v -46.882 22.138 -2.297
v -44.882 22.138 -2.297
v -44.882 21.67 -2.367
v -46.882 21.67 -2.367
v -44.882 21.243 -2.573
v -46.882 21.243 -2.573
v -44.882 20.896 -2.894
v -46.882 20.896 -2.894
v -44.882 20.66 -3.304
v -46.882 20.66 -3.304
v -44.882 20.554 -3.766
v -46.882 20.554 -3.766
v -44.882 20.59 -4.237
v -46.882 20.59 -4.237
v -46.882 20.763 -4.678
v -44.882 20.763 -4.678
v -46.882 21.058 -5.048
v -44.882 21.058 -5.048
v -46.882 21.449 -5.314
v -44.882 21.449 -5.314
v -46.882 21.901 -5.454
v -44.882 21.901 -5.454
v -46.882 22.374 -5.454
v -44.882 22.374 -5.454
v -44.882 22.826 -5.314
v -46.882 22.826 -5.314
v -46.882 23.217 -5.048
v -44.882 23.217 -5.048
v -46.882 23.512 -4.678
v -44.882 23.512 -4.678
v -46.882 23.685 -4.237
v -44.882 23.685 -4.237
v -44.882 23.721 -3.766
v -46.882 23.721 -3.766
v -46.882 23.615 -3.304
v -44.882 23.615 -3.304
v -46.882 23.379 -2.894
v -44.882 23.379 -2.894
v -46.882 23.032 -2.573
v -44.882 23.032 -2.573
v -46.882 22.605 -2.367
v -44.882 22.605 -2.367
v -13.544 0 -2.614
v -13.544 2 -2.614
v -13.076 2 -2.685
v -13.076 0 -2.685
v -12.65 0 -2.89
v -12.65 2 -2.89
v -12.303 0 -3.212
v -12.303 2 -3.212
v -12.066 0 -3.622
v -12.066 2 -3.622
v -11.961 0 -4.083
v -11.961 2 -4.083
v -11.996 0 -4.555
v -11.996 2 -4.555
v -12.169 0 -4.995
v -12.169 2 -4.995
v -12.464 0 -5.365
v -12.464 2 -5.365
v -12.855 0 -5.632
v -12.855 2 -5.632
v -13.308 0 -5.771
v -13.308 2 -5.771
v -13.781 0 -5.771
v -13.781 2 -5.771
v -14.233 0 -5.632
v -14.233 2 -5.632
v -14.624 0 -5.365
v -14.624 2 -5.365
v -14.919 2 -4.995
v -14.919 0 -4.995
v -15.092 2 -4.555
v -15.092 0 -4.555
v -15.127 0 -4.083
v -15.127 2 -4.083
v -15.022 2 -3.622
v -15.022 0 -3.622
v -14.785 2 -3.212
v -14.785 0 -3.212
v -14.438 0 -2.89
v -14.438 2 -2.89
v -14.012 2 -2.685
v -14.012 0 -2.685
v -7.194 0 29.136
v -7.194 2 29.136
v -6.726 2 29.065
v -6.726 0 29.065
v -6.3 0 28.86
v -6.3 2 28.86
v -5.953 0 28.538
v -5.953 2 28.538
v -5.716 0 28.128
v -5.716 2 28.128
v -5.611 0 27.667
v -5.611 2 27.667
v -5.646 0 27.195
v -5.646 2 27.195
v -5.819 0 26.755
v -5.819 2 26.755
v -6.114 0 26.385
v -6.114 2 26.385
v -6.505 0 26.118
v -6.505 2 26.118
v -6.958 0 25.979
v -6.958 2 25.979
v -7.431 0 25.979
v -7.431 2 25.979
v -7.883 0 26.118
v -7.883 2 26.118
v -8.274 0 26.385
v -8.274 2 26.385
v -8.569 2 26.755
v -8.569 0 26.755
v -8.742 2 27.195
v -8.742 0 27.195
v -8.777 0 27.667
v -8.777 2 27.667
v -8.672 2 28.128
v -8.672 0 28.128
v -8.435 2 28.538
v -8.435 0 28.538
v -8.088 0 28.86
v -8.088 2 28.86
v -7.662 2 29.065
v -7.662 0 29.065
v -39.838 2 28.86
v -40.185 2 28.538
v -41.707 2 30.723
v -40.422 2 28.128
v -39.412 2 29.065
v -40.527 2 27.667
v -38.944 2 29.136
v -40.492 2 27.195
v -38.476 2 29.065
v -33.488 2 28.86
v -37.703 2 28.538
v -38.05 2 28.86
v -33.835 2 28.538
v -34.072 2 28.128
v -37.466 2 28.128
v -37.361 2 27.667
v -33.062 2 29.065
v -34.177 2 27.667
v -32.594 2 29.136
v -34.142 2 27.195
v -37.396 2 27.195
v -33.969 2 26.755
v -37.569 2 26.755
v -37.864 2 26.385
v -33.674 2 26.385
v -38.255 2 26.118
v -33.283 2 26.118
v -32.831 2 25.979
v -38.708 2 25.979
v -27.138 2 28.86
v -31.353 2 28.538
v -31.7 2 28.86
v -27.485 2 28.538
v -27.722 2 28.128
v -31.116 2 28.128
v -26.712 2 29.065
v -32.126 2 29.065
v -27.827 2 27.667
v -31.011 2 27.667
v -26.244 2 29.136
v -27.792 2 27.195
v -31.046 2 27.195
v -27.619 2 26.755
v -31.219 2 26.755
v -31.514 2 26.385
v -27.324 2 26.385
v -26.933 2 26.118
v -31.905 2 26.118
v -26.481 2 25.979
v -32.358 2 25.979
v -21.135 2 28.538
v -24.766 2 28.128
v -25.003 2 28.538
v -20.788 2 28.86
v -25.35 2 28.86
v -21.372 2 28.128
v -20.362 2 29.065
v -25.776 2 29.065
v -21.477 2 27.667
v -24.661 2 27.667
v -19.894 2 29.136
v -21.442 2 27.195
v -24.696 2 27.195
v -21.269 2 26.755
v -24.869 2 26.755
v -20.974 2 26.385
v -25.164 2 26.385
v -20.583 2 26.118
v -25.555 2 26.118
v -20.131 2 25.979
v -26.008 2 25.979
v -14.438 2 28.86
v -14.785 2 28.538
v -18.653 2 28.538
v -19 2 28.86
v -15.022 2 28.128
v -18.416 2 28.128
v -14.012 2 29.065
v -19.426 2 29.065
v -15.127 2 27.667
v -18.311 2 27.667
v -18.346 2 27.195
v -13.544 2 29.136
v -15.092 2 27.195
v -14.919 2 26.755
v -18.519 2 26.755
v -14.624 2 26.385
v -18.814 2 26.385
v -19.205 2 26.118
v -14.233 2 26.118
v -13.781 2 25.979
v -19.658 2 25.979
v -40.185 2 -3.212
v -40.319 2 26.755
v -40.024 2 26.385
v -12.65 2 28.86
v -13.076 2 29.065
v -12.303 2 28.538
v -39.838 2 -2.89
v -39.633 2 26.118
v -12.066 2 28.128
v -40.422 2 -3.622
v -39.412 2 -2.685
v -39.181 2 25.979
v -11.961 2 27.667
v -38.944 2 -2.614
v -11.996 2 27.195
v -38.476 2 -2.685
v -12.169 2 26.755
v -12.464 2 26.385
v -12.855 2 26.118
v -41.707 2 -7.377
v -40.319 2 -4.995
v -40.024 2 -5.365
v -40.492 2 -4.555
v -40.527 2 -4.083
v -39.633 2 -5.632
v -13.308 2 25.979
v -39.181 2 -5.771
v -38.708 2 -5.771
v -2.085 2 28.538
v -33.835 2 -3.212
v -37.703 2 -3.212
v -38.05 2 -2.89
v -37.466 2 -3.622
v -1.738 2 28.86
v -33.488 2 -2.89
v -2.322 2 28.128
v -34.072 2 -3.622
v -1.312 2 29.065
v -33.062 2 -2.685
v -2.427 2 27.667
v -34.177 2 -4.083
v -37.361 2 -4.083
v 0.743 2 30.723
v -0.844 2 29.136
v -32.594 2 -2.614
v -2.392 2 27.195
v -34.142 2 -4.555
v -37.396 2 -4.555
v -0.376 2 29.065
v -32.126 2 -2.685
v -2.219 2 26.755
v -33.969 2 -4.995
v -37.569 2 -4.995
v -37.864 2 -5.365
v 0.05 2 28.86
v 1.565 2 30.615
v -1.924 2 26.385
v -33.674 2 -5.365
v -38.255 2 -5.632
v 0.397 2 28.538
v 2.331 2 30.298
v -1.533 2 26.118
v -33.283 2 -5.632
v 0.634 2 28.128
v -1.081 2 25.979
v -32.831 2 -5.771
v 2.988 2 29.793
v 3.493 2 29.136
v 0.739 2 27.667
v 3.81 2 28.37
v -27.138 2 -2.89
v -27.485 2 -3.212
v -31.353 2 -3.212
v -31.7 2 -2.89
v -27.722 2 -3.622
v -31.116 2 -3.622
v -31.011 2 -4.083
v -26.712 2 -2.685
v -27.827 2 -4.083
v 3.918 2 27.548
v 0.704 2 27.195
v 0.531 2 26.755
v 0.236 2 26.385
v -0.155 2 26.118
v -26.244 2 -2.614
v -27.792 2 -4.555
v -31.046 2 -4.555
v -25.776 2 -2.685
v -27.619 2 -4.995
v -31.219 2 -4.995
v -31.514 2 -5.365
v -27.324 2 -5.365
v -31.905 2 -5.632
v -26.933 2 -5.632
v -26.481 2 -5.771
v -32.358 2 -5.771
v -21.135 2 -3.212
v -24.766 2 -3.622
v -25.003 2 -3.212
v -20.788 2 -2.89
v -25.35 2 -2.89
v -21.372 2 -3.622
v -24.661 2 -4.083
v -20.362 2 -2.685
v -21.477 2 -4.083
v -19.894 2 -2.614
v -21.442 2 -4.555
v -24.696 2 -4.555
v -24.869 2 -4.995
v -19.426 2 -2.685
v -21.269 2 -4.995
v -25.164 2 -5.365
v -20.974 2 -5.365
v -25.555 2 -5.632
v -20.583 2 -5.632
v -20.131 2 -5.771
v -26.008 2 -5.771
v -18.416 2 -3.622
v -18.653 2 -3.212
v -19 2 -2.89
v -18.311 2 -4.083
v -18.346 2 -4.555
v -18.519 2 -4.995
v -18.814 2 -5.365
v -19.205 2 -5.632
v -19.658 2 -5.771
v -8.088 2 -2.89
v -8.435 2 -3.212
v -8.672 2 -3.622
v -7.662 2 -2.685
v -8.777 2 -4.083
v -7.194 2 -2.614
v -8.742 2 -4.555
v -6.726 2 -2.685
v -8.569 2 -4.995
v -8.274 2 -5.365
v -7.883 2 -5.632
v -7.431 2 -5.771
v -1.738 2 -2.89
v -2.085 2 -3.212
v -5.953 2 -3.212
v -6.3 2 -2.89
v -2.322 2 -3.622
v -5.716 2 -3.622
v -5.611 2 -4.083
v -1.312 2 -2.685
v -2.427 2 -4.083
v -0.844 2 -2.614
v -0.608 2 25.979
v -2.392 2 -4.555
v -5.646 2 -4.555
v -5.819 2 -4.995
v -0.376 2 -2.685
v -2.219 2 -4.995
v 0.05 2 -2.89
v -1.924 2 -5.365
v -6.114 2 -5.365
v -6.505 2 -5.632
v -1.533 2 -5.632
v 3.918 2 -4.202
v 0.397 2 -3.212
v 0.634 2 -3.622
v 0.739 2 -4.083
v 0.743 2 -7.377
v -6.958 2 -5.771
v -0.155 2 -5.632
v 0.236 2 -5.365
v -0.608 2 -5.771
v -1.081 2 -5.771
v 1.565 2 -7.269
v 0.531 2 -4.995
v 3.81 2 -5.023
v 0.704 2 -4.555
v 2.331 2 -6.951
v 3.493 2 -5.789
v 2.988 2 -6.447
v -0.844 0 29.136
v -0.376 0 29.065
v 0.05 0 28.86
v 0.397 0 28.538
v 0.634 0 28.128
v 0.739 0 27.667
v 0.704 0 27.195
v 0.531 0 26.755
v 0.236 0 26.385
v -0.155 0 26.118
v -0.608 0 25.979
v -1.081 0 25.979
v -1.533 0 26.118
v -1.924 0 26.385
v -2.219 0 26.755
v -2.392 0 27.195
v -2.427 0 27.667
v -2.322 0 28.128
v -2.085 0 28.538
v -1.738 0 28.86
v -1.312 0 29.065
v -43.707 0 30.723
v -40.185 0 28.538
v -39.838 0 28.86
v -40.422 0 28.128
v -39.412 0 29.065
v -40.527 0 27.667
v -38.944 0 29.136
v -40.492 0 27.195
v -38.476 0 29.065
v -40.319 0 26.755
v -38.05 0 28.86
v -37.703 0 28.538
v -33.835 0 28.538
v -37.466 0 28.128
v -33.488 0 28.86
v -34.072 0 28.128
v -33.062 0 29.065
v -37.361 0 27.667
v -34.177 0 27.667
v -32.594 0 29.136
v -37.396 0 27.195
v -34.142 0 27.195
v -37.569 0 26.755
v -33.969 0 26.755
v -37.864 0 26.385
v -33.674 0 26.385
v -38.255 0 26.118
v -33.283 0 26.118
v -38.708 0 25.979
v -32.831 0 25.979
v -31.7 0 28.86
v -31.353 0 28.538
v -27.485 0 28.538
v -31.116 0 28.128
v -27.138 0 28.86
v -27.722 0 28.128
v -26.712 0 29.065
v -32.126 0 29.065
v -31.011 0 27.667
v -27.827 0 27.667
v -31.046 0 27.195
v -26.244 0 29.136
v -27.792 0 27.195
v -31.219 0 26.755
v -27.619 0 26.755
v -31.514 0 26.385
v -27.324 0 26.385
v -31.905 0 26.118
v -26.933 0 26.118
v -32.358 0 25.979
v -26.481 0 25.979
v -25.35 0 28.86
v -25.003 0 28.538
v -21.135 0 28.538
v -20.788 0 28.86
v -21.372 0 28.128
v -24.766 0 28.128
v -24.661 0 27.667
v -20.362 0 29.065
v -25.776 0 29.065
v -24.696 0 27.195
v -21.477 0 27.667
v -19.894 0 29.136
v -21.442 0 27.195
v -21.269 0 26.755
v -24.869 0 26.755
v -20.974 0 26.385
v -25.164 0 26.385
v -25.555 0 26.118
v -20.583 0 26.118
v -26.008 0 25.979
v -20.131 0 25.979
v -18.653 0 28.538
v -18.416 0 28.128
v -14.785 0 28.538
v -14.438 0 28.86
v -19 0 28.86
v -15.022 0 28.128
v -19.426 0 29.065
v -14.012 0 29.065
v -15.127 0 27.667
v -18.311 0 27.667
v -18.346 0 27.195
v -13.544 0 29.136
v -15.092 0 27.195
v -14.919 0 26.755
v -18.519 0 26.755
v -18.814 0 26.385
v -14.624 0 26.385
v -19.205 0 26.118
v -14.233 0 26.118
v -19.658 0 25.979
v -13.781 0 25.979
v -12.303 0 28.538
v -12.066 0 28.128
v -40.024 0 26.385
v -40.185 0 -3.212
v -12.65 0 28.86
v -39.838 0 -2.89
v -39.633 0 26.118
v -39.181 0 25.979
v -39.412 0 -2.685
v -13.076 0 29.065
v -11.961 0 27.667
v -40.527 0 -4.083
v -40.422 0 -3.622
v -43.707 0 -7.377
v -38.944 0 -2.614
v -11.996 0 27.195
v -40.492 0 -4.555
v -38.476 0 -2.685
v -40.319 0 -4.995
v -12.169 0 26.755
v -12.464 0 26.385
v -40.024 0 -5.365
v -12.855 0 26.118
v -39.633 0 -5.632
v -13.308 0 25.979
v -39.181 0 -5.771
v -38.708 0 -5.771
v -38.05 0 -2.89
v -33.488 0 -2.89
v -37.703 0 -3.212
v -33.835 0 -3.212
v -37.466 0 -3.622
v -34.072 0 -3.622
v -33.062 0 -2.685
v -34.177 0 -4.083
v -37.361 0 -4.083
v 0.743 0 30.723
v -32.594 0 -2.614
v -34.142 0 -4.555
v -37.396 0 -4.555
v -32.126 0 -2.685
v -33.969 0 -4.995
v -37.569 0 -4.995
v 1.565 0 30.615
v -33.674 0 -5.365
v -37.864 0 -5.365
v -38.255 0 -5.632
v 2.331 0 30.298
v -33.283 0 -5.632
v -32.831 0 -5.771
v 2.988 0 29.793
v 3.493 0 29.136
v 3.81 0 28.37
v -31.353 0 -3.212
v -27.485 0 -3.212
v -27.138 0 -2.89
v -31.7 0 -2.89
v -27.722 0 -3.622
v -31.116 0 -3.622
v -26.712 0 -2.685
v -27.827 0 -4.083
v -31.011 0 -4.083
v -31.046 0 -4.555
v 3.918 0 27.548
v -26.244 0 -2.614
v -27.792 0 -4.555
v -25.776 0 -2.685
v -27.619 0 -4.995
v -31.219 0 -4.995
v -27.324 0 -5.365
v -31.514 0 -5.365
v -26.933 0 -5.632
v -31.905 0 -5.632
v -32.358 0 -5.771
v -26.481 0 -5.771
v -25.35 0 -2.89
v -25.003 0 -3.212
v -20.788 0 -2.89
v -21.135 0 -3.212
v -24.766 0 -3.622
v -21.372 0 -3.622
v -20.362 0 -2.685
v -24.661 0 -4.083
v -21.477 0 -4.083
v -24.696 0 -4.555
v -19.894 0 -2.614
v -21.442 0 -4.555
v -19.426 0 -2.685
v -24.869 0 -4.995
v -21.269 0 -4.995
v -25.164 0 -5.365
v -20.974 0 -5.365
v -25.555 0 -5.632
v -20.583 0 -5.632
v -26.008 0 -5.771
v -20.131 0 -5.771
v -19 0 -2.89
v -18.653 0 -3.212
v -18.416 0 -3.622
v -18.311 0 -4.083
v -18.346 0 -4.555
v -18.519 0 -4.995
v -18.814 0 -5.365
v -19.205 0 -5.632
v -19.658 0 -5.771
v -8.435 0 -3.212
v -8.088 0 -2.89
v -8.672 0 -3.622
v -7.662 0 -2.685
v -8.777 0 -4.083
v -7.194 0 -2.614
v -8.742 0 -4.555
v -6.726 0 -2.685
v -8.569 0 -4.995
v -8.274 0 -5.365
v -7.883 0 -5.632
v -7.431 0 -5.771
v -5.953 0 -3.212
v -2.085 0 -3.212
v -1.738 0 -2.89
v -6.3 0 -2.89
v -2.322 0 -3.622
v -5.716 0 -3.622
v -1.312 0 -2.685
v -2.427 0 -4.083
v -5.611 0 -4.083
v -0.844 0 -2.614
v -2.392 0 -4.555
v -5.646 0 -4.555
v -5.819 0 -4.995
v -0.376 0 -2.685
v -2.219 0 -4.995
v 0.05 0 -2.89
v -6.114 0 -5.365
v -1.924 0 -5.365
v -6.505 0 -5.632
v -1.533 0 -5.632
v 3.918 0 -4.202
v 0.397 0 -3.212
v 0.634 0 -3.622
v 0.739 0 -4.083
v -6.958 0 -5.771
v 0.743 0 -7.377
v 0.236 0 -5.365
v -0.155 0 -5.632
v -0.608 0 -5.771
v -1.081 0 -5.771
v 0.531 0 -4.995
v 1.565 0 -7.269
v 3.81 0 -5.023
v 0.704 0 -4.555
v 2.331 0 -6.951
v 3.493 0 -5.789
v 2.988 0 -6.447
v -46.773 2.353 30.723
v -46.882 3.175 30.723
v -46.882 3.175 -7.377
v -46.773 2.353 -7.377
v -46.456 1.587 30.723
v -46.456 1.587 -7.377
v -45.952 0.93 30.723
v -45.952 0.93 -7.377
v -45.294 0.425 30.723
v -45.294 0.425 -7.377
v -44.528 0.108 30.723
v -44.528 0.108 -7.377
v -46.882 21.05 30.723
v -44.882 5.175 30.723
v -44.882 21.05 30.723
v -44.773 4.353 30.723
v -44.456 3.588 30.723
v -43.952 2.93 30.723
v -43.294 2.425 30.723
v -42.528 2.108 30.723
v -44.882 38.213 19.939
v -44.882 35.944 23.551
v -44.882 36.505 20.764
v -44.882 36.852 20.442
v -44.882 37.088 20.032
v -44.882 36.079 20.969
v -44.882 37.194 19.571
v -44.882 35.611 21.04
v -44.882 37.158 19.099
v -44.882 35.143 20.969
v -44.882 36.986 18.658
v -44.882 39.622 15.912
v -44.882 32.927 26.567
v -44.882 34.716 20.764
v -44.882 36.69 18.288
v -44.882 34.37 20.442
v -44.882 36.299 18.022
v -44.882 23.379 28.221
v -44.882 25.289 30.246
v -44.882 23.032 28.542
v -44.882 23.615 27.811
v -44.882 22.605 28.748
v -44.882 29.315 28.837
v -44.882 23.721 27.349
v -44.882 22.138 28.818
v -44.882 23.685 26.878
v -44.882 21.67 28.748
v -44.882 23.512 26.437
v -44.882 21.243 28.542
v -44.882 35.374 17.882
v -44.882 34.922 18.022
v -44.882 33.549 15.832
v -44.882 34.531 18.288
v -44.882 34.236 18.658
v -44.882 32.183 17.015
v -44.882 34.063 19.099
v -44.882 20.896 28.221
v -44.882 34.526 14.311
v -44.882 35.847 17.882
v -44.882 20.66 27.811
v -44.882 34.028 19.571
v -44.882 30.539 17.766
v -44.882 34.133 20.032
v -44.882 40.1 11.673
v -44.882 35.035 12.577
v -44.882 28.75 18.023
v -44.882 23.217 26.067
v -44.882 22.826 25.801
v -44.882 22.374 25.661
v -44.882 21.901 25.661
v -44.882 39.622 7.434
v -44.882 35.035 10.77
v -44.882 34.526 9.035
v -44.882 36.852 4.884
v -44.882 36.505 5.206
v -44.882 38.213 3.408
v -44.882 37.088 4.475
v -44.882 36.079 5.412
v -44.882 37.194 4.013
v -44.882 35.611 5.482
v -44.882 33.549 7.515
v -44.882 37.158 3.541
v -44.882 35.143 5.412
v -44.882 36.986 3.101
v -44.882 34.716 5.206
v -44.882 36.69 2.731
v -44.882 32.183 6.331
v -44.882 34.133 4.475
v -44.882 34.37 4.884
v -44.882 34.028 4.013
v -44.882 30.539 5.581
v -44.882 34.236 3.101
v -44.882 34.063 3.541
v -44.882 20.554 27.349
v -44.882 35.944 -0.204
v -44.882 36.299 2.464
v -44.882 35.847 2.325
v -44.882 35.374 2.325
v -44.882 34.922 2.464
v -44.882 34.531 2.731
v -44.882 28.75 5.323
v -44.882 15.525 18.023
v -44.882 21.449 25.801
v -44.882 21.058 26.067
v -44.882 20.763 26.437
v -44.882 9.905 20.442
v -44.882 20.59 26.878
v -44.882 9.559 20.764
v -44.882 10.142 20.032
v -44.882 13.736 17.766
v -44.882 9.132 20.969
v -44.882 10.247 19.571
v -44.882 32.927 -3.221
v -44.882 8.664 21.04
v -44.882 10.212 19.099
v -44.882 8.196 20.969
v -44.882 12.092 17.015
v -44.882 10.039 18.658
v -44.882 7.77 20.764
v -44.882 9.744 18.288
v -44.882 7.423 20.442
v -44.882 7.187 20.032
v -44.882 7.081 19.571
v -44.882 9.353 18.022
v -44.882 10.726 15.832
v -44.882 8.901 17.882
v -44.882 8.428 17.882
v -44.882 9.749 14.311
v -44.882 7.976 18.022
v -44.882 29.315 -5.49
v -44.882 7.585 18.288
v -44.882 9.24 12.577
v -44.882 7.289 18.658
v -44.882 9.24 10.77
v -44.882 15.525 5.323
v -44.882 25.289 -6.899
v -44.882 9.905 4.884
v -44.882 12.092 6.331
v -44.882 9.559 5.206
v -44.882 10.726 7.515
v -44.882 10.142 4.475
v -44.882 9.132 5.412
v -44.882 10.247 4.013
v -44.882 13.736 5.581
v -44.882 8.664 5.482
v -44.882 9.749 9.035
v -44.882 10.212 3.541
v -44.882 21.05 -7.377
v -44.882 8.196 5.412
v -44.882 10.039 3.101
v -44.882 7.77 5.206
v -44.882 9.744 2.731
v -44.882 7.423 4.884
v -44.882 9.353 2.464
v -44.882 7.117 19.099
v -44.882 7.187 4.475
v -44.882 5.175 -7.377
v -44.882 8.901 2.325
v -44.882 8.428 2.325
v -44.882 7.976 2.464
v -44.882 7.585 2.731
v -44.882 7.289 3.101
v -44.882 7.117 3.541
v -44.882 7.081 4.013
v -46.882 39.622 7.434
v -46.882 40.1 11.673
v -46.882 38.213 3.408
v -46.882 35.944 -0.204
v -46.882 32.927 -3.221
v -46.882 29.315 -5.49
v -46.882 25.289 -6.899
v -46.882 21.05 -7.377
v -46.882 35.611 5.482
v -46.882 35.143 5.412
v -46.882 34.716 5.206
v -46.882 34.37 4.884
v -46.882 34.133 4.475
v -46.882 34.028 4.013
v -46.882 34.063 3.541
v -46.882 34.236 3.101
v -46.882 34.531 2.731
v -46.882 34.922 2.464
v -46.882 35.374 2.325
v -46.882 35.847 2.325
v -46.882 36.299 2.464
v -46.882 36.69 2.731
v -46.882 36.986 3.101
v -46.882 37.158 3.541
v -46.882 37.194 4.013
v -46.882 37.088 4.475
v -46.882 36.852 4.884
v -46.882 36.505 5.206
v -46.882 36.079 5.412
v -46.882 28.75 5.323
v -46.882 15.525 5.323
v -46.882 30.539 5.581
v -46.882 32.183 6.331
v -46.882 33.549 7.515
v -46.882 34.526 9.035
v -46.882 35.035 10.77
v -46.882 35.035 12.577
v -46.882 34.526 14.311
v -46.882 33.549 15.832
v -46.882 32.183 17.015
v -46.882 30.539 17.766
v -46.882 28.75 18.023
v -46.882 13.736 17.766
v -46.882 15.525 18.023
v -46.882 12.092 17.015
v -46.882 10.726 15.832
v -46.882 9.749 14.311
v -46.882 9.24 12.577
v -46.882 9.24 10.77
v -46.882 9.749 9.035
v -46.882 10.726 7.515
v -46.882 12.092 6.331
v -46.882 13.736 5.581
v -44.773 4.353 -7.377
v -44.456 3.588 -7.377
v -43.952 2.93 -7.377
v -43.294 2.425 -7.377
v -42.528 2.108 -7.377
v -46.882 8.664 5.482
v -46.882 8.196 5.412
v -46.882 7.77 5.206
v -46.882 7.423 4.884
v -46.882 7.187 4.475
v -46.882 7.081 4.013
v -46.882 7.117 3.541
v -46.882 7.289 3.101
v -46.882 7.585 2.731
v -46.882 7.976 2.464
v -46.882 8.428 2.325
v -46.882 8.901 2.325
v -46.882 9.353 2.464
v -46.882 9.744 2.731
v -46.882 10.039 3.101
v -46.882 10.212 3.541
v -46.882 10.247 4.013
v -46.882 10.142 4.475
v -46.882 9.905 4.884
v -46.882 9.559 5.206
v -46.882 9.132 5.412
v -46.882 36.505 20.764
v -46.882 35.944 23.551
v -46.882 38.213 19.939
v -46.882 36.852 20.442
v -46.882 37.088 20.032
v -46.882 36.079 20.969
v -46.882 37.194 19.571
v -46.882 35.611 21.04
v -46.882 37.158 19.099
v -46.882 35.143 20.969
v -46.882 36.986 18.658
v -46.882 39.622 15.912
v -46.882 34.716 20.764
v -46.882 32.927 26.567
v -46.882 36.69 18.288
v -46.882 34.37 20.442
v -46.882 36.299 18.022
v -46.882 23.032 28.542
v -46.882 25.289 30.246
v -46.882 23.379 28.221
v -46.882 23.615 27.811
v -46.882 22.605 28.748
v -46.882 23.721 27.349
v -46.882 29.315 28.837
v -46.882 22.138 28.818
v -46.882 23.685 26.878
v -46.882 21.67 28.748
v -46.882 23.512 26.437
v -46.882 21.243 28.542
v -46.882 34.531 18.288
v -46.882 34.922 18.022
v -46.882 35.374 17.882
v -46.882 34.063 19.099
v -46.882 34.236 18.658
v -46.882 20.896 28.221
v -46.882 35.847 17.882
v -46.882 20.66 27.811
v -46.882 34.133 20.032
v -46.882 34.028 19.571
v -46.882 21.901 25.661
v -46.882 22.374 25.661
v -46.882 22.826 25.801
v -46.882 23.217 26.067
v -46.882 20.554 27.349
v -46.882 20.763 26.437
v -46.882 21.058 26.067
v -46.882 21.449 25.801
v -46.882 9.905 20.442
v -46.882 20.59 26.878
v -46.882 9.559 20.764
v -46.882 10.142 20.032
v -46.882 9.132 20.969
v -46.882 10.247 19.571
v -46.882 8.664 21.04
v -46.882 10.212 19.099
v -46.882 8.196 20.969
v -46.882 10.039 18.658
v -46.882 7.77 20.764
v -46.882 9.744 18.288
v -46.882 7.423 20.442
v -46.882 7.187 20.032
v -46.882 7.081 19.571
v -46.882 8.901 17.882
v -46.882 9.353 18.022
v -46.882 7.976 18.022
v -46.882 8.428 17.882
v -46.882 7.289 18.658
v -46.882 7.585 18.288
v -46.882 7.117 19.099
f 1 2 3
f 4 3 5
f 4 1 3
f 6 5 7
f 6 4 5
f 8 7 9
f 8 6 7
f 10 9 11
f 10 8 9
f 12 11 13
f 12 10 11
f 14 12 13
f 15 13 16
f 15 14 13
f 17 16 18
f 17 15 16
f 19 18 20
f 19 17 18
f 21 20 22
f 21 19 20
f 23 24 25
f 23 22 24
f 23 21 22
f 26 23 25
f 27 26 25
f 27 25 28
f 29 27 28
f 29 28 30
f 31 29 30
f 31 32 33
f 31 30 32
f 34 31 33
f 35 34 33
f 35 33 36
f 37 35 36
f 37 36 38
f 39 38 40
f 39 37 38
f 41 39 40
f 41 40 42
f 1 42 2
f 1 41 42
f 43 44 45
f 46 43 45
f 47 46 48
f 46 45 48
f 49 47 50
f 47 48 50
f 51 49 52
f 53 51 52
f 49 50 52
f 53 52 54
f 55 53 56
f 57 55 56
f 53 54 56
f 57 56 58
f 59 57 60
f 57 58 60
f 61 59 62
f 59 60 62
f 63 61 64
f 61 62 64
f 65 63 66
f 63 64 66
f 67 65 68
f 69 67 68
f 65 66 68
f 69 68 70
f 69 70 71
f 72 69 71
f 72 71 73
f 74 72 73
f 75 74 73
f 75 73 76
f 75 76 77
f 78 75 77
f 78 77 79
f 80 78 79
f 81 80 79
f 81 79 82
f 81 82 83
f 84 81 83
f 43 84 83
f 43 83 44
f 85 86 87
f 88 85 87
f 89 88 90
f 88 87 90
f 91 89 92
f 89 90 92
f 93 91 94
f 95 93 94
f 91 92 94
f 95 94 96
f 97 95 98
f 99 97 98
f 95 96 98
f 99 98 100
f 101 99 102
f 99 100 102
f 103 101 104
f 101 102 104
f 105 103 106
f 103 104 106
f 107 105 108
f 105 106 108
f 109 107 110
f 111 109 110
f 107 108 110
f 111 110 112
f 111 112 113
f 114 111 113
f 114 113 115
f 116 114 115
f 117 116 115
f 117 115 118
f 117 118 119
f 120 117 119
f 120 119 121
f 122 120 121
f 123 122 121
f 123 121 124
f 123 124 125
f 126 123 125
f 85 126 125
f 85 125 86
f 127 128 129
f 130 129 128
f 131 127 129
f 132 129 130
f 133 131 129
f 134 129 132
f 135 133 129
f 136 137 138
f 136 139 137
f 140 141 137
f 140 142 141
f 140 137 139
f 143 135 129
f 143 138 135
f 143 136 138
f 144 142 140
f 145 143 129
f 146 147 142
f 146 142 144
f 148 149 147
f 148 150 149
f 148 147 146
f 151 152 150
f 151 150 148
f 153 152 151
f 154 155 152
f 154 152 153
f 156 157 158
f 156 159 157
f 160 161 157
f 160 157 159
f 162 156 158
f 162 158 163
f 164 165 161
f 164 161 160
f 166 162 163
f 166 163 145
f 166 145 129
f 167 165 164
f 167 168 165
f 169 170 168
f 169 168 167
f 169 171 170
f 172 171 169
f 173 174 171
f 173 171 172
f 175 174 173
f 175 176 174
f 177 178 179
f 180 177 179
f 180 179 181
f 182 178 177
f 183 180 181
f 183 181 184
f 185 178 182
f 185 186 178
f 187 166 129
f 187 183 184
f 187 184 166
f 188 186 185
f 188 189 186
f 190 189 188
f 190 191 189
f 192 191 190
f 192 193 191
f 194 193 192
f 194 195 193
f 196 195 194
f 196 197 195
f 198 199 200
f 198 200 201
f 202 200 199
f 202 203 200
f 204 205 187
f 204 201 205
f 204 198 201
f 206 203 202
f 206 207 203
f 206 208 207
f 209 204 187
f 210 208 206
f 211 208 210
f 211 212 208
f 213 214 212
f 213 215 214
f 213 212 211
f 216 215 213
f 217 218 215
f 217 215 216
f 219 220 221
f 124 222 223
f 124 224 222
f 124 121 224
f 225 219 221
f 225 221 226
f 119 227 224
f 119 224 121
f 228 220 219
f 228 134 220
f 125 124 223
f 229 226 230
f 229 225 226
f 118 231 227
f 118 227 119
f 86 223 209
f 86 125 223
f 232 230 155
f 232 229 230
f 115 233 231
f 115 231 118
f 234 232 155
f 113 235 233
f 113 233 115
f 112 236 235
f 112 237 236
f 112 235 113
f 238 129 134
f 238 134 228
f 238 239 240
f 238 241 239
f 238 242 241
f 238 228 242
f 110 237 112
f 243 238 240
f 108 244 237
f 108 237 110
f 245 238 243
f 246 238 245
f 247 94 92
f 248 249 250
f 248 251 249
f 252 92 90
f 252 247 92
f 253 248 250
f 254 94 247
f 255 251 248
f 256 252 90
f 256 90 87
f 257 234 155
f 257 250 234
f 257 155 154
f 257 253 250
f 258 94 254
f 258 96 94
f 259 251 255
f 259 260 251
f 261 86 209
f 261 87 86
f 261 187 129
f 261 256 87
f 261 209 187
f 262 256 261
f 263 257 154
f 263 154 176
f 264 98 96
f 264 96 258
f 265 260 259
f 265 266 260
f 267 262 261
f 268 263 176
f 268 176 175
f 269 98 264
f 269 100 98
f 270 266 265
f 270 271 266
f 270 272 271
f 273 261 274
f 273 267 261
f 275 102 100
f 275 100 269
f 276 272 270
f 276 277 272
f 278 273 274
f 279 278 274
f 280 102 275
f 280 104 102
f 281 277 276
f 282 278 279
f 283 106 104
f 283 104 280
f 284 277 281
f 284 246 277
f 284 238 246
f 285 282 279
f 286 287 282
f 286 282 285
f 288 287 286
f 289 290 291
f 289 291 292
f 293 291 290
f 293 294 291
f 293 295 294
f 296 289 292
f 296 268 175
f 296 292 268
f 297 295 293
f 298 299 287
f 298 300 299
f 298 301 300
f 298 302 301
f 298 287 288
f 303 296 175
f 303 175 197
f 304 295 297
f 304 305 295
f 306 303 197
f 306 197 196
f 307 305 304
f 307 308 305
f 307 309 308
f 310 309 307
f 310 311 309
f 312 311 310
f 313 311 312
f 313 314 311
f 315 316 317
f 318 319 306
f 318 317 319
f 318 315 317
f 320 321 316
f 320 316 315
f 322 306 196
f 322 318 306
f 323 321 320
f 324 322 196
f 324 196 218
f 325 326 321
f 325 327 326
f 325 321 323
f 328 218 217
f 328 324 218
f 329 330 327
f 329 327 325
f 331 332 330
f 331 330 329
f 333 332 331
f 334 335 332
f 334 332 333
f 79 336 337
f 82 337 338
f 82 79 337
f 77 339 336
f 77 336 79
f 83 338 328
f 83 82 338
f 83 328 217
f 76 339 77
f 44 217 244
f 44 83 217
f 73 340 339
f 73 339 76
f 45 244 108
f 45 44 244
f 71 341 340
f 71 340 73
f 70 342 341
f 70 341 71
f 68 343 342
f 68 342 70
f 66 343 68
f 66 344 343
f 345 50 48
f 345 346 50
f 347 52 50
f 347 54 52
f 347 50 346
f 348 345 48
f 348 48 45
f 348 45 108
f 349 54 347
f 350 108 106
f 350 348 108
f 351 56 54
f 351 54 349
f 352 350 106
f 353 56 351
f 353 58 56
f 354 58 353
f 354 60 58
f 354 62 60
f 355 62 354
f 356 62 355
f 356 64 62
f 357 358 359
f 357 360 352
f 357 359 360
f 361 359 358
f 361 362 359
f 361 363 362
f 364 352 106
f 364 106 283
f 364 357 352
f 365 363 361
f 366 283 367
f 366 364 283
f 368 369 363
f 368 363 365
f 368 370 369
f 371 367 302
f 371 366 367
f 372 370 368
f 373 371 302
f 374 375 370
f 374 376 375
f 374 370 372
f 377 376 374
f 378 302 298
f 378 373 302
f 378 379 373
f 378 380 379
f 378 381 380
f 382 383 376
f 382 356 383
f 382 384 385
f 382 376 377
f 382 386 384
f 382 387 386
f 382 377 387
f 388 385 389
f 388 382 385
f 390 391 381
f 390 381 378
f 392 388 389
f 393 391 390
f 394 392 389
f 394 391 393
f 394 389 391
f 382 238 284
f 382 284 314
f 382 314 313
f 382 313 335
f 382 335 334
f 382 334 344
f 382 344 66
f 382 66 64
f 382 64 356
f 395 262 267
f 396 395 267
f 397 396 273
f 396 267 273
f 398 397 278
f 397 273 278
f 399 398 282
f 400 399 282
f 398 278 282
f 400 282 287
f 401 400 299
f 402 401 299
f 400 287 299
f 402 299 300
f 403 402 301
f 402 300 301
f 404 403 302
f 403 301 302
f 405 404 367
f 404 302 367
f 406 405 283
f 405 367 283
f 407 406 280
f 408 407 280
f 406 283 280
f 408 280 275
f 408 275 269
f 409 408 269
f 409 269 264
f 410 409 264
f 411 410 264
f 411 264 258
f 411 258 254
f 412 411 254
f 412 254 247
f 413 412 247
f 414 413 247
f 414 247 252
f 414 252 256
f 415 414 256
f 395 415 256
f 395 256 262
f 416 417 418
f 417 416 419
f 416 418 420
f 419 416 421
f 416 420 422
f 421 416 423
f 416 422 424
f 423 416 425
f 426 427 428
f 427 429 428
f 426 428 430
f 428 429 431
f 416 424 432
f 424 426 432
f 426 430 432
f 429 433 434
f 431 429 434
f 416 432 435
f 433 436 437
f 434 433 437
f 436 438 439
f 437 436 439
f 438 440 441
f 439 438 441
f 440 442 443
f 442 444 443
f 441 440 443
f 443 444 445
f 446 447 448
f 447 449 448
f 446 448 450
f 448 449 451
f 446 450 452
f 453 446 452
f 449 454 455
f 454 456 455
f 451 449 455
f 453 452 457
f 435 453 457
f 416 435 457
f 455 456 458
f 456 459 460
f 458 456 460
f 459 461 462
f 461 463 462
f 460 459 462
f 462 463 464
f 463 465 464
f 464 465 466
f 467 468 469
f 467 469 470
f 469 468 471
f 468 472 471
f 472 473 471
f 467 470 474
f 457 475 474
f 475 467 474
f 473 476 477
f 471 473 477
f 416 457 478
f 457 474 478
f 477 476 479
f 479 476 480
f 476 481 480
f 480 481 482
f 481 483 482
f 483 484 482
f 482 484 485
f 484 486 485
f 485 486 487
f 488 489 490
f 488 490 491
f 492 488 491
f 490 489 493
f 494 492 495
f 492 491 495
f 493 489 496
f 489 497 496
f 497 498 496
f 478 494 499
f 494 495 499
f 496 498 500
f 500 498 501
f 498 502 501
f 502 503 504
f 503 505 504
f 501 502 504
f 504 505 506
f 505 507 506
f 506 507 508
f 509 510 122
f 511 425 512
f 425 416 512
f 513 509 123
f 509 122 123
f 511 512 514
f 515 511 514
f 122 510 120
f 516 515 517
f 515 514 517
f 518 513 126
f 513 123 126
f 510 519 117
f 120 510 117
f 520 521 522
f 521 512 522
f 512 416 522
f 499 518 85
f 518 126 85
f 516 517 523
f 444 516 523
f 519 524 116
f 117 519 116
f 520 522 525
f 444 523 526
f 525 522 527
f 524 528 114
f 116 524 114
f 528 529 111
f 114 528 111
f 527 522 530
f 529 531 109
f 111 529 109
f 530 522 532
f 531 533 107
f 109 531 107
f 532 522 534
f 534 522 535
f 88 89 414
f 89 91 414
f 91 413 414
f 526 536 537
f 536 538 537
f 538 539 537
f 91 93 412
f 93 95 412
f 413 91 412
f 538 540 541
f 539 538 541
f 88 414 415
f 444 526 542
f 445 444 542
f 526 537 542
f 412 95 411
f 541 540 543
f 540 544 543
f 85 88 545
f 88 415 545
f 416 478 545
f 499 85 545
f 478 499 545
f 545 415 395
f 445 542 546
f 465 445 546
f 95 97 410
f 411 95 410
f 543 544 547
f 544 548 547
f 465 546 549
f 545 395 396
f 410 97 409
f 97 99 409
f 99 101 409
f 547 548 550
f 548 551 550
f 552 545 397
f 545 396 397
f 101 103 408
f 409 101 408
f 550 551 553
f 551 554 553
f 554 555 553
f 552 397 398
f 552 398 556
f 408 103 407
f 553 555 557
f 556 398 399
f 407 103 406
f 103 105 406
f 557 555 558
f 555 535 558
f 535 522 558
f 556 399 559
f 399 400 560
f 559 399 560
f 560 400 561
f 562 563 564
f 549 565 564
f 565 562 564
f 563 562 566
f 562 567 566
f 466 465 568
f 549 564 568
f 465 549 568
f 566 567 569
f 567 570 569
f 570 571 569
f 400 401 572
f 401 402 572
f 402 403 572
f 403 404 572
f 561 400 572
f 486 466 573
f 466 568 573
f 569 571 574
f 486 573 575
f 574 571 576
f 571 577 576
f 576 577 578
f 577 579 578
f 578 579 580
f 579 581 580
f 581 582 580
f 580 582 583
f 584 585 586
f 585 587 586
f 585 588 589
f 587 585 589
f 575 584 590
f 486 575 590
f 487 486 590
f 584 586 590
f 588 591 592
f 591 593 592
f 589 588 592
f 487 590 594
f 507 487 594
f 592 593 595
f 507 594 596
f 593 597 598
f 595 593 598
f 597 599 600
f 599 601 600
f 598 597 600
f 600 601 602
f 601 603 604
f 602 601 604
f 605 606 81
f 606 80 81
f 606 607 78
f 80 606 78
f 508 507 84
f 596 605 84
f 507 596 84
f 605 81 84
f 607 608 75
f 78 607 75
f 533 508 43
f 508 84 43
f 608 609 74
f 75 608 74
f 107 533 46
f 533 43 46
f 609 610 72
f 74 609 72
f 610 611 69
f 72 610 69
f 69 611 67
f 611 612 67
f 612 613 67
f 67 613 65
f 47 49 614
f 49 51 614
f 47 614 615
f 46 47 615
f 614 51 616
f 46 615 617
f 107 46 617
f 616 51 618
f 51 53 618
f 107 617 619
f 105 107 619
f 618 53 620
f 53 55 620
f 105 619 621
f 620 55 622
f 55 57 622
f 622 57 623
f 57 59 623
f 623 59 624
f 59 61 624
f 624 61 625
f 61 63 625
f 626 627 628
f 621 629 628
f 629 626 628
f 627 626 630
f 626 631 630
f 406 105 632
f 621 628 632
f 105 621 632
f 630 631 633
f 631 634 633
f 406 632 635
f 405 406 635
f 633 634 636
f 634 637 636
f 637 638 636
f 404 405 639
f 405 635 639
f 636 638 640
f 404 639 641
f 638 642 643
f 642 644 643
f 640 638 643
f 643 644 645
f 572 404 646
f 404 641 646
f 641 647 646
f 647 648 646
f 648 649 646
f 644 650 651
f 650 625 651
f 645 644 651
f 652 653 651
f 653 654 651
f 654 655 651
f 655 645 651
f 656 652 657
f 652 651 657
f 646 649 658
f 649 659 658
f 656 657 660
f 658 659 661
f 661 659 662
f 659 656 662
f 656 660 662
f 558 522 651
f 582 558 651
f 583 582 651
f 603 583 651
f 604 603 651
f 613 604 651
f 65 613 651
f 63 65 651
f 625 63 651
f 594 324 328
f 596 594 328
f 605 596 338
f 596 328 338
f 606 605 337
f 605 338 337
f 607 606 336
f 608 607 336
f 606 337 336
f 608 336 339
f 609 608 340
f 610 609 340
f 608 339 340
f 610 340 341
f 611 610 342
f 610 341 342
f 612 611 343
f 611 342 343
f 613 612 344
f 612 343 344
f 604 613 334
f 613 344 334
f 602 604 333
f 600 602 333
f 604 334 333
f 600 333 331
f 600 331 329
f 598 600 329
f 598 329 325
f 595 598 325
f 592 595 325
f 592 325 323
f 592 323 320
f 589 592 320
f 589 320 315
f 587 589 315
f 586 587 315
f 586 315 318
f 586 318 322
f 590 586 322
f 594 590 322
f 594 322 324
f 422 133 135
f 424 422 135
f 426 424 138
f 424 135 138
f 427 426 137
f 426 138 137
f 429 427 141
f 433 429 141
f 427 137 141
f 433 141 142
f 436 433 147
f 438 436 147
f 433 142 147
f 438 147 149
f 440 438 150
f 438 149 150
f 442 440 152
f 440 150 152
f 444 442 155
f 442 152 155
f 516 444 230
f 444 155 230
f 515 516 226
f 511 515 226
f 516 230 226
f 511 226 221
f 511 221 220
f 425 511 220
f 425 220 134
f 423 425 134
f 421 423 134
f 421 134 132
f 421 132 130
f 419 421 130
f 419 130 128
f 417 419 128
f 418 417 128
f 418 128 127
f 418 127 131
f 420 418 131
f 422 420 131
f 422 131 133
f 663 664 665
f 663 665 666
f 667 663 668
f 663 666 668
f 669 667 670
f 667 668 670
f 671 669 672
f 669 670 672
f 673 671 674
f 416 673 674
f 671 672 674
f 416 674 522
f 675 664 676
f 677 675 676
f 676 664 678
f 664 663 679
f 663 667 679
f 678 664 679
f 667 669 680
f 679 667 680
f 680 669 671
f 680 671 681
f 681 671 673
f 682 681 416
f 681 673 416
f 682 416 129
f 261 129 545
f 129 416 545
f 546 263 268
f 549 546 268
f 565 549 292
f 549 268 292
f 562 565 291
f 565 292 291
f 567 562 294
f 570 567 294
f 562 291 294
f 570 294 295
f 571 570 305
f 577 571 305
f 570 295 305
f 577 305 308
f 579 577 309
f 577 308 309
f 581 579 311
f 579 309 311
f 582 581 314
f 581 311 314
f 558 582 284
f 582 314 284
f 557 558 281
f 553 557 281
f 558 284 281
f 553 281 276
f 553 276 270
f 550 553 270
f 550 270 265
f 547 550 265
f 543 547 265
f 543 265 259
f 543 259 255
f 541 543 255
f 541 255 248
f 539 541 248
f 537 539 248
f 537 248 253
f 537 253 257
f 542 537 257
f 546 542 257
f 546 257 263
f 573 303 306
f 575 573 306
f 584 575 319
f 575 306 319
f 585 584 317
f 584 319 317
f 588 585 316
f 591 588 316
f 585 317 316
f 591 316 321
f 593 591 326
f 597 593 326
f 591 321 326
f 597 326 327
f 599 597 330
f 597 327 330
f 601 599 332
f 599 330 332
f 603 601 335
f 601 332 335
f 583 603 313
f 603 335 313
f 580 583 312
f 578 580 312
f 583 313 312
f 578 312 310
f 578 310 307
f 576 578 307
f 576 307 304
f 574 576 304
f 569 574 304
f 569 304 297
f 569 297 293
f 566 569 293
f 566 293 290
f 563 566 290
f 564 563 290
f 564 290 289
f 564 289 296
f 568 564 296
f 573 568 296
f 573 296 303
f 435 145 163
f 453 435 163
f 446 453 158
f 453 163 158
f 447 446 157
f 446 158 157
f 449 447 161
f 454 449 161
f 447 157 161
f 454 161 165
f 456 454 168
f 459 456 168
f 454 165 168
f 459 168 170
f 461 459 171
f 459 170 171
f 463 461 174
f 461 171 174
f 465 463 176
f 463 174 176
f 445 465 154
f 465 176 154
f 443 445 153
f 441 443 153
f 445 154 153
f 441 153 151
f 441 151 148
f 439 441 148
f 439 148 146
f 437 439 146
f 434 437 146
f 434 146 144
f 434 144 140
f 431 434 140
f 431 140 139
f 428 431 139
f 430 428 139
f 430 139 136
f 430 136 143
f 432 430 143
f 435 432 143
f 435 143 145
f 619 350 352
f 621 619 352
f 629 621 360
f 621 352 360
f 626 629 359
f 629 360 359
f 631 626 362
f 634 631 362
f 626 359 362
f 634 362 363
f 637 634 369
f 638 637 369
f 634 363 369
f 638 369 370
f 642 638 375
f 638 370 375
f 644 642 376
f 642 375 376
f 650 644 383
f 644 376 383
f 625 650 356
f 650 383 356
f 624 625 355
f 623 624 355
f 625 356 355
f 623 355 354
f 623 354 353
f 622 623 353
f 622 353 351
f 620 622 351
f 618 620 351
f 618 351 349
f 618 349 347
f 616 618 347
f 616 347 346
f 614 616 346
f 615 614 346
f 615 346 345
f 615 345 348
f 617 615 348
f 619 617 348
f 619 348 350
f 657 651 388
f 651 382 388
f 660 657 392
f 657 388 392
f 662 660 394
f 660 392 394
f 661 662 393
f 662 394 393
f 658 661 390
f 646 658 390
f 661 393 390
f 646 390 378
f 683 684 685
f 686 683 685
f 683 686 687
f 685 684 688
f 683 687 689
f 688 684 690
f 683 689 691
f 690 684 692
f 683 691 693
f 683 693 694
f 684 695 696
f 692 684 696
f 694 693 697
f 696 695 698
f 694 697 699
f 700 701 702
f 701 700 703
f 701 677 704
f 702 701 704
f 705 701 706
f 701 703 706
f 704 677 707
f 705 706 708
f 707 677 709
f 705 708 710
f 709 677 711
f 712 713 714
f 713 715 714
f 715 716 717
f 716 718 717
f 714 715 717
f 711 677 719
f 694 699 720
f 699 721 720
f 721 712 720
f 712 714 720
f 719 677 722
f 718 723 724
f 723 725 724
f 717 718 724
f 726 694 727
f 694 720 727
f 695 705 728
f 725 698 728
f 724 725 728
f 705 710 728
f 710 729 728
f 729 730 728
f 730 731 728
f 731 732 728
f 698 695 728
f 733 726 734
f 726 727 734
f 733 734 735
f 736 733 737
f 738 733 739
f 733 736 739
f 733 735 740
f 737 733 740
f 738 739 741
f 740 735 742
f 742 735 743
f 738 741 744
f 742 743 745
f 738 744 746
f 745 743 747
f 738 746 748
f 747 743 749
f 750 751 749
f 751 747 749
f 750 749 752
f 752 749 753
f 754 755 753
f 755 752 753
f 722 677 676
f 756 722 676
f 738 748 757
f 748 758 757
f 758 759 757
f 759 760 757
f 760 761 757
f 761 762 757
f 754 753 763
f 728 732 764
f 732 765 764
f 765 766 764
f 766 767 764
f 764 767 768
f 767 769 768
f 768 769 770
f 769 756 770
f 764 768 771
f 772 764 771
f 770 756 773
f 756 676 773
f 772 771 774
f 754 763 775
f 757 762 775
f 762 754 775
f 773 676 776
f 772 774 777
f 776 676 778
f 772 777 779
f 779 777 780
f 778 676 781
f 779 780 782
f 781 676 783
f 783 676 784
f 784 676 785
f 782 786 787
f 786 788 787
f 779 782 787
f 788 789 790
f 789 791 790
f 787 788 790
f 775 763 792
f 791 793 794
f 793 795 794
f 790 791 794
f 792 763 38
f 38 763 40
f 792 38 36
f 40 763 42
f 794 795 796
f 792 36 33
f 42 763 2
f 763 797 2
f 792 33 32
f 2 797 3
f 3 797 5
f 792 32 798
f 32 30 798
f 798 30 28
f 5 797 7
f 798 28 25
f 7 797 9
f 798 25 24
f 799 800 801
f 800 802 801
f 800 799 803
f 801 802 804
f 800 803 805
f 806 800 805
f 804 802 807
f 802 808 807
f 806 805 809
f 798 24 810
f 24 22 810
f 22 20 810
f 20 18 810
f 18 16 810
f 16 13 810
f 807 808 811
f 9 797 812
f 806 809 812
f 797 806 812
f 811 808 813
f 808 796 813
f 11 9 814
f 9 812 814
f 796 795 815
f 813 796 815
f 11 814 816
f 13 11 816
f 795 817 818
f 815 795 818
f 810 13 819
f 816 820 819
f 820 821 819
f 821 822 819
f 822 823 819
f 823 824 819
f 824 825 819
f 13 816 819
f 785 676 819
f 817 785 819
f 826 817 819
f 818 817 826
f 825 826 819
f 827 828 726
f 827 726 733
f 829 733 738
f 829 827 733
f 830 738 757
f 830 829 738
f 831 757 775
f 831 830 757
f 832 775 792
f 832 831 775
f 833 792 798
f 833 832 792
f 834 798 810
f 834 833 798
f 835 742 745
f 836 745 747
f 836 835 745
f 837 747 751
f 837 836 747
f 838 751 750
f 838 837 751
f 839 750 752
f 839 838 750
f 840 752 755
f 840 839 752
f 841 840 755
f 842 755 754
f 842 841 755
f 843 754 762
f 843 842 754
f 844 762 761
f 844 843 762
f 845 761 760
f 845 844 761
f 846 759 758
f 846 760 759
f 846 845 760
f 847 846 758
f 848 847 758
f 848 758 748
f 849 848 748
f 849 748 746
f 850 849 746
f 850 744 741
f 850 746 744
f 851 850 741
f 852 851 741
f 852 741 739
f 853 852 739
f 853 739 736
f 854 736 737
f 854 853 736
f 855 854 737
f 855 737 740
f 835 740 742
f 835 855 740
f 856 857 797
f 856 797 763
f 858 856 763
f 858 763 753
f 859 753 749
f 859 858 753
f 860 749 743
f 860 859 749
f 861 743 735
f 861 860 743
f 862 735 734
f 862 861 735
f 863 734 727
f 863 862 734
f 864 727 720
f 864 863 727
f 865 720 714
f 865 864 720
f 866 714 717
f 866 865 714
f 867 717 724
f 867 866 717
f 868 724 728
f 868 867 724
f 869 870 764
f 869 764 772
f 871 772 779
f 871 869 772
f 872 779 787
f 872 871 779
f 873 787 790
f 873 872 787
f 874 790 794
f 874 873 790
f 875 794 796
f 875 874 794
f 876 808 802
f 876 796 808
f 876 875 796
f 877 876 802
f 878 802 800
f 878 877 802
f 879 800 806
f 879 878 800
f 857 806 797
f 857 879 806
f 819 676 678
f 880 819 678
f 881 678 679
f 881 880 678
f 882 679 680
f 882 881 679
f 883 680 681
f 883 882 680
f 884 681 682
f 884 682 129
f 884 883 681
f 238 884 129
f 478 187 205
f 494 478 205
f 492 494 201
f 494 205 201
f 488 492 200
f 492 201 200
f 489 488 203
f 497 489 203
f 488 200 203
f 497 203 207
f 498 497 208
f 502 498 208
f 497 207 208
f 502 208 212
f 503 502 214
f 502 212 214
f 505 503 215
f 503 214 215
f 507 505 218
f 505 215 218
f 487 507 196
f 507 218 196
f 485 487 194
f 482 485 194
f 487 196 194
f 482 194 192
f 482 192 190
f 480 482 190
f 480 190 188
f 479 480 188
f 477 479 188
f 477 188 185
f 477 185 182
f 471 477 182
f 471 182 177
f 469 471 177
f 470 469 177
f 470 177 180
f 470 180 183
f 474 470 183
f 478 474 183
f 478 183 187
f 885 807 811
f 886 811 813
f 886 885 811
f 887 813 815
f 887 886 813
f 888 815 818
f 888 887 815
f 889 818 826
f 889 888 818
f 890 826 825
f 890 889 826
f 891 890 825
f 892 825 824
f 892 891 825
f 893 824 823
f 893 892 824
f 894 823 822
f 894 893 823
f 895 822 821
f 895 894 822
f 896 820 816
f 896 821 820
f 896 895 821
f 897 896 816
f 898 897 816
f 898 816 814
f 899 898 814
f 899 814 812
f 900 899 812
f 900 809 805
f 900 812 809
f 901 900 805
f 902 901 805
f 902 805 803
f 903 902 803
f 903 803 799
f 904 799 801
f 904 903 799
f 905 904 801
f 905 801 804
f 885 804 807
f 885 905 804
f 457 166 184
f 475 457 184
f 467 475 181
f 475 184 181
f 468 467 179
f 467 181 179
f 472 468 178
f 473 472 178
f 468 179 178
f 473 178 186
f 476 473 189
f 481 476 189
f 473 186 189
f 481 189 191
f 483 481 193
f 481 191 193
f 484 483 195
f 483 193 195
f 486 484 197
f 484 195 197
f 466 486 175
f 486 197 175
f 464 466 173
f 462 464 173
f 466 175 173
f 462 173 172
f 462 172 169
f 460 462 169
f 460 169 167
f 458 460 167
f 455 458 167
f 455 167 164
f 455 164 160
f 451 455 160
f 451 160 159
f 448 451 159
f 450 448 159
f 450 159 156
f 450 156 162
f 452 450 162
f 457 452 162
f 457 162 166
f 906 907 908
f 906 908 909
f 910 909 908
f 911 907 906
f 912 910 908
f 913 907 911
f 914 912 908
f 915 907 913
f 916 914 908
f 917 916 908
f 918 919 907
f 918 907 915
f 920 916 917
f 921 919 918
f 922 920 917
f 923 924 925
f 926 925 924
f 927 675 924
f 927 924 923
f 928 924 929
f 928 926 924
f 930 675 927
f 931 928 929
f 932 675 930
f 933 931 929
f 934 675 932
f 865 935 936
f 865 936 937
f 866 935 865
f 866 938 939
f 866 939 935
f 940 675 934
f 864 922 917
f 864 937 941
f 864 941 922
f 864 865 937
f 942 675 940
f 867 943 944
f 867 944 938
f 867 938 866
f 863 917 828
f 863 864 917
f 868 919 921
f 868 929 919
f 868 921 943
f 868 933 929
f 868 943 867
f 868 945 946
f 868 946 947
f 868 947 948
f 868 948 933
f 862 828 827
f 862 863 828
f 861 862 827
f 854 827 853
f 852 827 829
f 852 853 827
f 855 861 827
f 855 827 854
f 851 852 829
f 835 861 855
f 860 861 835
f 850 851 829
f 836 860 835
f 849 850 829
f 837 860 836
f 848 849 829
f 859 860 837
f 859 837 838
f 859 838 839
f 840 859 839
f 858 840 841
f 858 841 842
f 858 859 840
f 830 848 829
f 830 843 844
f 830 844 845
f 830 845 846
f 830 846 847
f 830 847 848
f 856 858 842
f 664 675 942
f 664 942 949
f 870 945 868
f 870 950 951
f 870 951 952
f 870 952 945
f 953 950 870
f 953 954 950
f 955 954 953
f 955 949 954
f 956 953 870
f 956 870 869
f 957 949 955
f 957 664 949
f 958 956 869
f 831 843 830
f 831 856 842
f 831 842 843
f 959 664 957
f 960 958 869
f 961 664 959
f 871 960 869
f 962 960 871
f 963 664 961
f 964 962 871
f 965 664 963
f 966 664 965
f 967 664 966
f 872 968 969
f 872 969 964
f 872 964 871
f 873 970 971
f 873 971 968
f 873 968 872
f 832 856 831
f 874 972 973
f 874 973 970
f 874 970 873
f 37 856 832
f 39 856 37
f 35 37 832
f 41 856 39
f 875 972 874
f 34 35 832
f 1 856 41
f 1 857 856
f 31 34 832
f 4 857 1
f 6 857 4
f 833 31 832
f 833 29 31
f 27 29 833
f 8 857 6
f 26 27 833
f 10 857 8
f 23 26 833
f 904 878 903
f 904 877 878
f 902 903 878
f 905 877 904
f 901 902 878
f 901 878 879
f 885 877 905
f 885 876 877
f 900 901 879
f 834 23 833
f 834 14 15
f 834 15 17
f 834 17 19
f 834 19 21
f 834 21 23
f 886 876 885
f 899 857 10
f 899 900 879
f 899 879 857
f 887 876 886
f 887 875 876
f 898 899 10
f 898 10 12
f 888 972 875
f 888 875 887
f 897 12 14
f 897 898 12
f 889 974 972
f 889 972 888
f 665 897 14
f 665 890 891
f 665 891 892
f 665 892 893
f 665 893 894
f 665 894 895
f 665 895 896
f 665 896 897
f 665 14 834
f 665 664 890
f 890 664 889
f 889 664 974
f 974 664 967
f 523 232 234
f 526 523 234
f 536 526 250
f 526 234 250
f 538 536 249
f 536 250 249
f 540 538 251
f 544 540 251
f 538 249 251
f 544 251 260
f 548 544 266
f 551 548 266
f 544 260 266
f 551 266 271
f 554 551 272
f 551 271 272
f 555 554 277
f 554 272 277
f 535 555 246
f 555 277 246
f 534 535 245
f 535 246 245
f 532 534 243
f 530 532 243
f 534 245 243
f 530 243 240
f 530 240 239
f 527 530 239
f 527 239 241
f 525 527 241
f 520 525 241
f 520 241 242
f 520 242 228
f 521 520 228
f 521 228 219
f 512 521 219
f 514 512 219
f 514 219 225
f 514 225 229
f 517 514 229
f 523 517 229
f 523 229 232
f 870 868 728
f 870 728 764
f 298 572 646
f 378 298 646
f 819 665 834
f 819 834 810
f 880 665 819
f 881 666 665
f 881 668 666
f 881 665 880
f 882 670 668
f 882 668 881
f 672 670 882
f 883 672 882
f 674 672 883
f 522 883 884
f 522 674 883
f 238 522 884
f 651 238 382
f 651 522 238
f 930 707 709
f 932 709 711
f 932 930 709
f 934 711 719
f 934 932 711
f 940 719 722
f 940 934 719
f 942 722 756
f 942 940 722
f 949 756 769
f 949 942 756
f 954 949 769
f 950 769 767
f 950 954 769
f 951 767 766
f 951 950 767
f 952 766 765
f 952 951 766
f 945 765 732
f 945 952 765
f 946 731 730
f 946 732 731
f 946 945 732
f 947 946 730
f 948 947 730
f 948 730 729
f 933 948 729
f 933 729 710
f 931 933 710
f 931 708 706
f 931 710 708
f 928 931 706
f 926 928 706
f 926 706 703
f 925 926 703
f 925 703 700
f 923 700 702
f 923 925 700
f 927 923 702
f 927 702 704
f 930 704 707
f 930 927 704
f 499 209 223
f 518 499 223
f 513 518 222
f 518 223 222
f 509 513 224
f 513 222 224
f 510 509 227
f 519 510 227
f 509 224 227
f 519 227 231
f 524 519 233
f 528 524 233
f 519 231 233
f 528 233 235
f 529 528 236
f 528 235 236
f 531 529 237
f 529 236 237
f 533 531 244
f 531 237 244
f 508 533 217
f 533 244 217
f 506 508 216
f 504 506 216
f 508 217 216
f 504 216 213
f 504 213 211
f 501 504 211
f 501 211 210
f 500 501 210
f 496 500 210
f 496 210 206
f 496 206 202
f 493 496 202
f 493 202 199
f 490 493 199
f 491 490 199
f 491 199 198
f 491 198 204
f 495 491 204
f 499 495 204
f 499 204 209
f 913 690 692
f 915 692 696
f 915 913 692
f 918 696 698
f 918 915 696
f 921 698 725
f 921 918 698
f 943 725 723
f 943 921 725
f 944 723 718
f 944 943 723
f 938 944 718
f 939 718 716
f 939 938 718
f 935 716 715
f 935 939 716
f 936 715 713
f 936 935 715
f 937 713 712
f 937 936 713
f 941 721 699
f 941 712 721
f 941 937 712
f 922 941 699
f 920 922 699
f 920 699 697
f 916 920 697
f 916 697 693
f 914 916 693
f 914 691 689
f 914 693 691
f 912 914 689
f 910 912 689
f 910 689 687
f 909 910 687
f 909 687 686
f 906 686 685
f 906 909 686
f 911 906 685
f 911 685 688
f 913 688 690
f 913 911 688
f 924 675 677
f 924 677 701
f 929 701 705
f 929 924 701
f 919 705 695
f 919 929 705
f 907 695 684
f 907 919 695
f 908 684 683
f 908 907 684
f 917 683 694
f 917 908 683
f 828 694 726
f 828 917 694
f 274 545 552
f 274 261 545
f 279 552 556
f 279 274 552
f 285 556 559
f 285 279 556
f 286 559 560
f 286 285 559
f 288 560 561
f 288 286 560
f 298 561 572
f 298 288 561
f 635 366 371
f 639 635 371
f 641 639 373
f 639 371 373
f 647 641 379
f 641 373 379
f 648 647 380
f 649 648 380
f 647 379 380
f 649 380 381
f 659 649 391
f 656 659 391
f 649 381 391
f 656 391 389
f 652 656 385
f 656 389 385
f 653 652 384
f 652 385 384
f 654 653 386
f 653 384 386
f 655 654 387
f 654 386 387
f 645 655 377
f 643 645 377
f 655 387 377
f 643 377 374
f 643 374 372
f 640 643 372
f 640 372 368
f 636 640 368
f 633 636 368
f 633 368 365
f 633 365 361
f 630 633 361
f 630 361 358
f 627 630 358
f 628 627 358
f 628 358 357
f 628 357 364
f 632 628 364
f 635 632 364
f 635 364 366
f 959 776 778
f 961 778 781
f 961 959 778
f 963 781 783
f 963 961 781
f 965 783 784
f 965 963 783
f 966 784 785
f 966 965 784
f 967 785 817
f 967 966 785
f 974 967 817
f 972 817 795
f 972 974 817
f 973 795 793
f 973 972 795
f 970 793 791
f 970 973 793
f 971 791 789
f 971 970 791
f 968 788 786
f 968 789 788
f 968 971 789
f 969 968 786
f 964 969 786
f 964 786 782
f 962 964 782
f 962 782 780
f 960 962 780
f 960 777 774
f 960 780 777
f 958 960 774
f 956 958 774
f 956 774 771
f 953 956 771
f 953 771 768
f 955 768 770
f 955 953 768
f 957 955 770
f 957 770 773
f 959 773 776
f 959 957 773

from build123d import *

# Parameters (mm, degrees)
SKETCH1_W           = 50.8
SKETCH1_H           = 38.1
BOSS_EXTRUDE1_DEPTH = 2.00000108
SKETCH2_W           = 2.00000108
SKETCH2_H           = 38.1
BOSS_EXTRUDE2_DEPTH = 38.1
SKETCH4_R           = 1.5875
CUT_EXTRUDE1_DEPTH  = 5.08
CUT_EXTRUDE3_DEPTH  = 2.54
FILLET1_R           = 3.175
SKETCH6_R           = 1.5875
CUT_EXTRUDE4_DEPTH  = 2.54


with BuildPart() as part:
    # Sketch1 → Boss-Extrude1 (new body)
    with BuildSketch(Plane(origin=(0, 0, 0), x_dir=(1, 0, 0), z_dir=(0, 1, 0))):
        with Locations((-21.481677668, -11.673311185)):
            Rectangle(SKETCH1_W, SKETCH1_H)
    extrude(amount=BOSS_EXTRUDE1_DEPTH)

    # Sketch2 → Boss-Extrude2 (add)
    with BuildSketch(Plane(origin=(0, 2.00000108, 0), x_dir=(1, 0, 0), z_dir=(0, 1, 0))):
        with Locations((-45.881677128, -11.673311185)):
            Rectangle(SKETCH2_W, SKETCH2_H)
    extrude(amount=BOSS_EXTRUDE2_DEPTH)

    # Sketch4 → Cut-Extrude1 (cut)
    with BuildSketch(Plane(origin=(0, 2.00000108, 0), x_dir=(1, 0, 0), z_dir=(0, 1, 0))):
        with Locations(Location((-0.844177668, -27.548311185, 0), (0, 0, 270))):
            Circle(SKETCH4_R)
        with Locations(Location((-7.194177668, -27.548311185, 0), (0, 0, 270))):
            Circle(SKETCH4_R)
        with Locations(Location((-13.544177668, -27.548311185, 0), (0, 0, 270))):
            Circle(SKETCH4_R)
        with Locations(Location((-19.894177668, -27.548311185, 0), (0, 0, 270))):
            Circle(SKETCH4_R)
        with Locations(Location((-26.244177668, -27.548311185, 0), (0, 0, 270))):
            Circle(SKETCH4_R)
        with Locations(Location((-32.594177668, -27.548311185, 0), (0, 0, 270))):
            Circle(SKETCH4_R)
        with Locations(Location((-38.944177668, -27.548311185, 0), (0, 0, 270))):
            Circle(SKETCH4_R)
        with Locations(Location((-0.844177668, 4.201688815, 0), (0, 0, 270))):
            Circle(SKETCH4_R)
        with Locations(Location((-7.194177668, 4.201688815, 0), (0, 0, 270))):
            Circle(SKETCH4_R)
        with Locations(Location((-13.544177668, 4.201688815, 0), (0, 0, 270))):
            Circle(SKETCH4_R)
        with Locations(Location((-19.894177668, 4.201688815, 0), (0, 0, 270))):
            Circle(SKETCH4_R)
        with Locations(Location((-26.244177668, 4.201688815, 0), (0, 0, 270))):
            Circle(SKETCH4_R)
        with Locations(Location((-32.594177668, 4.201688815, 0), (0, 0, 270))):
            Circle(SKETCH4_R)
        with Locations(Location((-38.944177668, 4.201688815, 0), (0, 0, 270))):
            Circle(SKETCH4_R)
    extrude(amount=-CUT_EXTRUDE1_DEPTH, mode=Mode.SUBTRACT)

    # Sketch5 → Cut-Extrude3 (cut)
    with BuildSketch(Plane(origin=(-46.881677668, 0, 30.723311185), x_dir=(0, 0, -1), z_dir=(1, 0, 0))):
        with BuildLine():
            ThreePointArc((19.05, 40.10000108), (32.520384182, 34.520385262), (38.1, 21.05000108))
            Line((38.1, 21.05000108), (38.1, 40.10000108))
            Line((38.1, 40.10000108), (19.05, 40.10000108))
        make_face()
        with BuildLine():
            Line((0, 40.10000108), (0, 21.05000108))
            ThreePointArc((0, 21.05000108), (5.579615818, 34.520385262), (19.05, 40.10000108))
            Line((19.05, 40.10000108), (0, 40.10000108))
        make_face()
    extrude(amount=CUT_EXTRUDE3_DEPTH, mode=Mode.SUBTRACT)

    # Fillet1
    fillet1_edges = [part.edges().sort_by_distance(p)[0] for p in [
        (-46.881677668, 0, 11.673311185),
        (-44.881676588, 2.00000108, 11.673311185),
        (3.918322332, 1.00000054, -7.376688815),
        (3.918322332, 1.00000054, 30.723311185),
    ]]
    fillet(fillet1_edges, radius=FILLET1_R)

    # Sketch6 → Cut-Extrude4 (cut)
    with BuildSketch(Plane(origin=(-46.881677668, 0, 30.723311185), x_dir=(0, 0, -1), z_dir=(1, 0, 0))):
        with Locations(Location((26.82875, 35.610695759, 0), (0, 0, 180))):
            Circle(SKETCH6_R)
        with Locations(Location((11.27125, 35.610695759, 0), (0, 0, 180))):
            Circle(SKETCH6_R)
        with Locations(Location((3.4925, 22.13750554, 0), (0, 0, 180))):
            Circle(SKETCH6_R)
        with BuildLine():
            Line((12.7, 21.05000108), (12.7, 15.525))
            ThreePointArc((12.7, 15.525), (19.05, 9.175), (25.4, 15.525))
            Line((25.4, 15.525), (25.4, 21.05000108))
            Line((25.4, 21.05000108), (25.4, 28.75001108))
            ThreePointArc((25.4, 28.75001108), (19.05, 35.10001108), (12.7, 28.75001108))
            Line((12.7, 28.75001108), (12.7, 21.05000108))
        make_face()
        with Locations(Location((34.6075, 22.13750554, 0), (0, 0, 180))):
            Circle(SKETCH6_R)
        with Locations(Location((26.82875, 8.664315321, 0), (0, 0, 180))):
            Circle(SKETCH6_R)
        with Locations(Location((11.27125, 8.664315321, 0), (0, 0, 180))):
            Circle(SKETCH6_R)
    extrude(amount=CUT_EXTRUDE4_DEPTH, mode=Mode.SUBTRACT)


solid = part.part
